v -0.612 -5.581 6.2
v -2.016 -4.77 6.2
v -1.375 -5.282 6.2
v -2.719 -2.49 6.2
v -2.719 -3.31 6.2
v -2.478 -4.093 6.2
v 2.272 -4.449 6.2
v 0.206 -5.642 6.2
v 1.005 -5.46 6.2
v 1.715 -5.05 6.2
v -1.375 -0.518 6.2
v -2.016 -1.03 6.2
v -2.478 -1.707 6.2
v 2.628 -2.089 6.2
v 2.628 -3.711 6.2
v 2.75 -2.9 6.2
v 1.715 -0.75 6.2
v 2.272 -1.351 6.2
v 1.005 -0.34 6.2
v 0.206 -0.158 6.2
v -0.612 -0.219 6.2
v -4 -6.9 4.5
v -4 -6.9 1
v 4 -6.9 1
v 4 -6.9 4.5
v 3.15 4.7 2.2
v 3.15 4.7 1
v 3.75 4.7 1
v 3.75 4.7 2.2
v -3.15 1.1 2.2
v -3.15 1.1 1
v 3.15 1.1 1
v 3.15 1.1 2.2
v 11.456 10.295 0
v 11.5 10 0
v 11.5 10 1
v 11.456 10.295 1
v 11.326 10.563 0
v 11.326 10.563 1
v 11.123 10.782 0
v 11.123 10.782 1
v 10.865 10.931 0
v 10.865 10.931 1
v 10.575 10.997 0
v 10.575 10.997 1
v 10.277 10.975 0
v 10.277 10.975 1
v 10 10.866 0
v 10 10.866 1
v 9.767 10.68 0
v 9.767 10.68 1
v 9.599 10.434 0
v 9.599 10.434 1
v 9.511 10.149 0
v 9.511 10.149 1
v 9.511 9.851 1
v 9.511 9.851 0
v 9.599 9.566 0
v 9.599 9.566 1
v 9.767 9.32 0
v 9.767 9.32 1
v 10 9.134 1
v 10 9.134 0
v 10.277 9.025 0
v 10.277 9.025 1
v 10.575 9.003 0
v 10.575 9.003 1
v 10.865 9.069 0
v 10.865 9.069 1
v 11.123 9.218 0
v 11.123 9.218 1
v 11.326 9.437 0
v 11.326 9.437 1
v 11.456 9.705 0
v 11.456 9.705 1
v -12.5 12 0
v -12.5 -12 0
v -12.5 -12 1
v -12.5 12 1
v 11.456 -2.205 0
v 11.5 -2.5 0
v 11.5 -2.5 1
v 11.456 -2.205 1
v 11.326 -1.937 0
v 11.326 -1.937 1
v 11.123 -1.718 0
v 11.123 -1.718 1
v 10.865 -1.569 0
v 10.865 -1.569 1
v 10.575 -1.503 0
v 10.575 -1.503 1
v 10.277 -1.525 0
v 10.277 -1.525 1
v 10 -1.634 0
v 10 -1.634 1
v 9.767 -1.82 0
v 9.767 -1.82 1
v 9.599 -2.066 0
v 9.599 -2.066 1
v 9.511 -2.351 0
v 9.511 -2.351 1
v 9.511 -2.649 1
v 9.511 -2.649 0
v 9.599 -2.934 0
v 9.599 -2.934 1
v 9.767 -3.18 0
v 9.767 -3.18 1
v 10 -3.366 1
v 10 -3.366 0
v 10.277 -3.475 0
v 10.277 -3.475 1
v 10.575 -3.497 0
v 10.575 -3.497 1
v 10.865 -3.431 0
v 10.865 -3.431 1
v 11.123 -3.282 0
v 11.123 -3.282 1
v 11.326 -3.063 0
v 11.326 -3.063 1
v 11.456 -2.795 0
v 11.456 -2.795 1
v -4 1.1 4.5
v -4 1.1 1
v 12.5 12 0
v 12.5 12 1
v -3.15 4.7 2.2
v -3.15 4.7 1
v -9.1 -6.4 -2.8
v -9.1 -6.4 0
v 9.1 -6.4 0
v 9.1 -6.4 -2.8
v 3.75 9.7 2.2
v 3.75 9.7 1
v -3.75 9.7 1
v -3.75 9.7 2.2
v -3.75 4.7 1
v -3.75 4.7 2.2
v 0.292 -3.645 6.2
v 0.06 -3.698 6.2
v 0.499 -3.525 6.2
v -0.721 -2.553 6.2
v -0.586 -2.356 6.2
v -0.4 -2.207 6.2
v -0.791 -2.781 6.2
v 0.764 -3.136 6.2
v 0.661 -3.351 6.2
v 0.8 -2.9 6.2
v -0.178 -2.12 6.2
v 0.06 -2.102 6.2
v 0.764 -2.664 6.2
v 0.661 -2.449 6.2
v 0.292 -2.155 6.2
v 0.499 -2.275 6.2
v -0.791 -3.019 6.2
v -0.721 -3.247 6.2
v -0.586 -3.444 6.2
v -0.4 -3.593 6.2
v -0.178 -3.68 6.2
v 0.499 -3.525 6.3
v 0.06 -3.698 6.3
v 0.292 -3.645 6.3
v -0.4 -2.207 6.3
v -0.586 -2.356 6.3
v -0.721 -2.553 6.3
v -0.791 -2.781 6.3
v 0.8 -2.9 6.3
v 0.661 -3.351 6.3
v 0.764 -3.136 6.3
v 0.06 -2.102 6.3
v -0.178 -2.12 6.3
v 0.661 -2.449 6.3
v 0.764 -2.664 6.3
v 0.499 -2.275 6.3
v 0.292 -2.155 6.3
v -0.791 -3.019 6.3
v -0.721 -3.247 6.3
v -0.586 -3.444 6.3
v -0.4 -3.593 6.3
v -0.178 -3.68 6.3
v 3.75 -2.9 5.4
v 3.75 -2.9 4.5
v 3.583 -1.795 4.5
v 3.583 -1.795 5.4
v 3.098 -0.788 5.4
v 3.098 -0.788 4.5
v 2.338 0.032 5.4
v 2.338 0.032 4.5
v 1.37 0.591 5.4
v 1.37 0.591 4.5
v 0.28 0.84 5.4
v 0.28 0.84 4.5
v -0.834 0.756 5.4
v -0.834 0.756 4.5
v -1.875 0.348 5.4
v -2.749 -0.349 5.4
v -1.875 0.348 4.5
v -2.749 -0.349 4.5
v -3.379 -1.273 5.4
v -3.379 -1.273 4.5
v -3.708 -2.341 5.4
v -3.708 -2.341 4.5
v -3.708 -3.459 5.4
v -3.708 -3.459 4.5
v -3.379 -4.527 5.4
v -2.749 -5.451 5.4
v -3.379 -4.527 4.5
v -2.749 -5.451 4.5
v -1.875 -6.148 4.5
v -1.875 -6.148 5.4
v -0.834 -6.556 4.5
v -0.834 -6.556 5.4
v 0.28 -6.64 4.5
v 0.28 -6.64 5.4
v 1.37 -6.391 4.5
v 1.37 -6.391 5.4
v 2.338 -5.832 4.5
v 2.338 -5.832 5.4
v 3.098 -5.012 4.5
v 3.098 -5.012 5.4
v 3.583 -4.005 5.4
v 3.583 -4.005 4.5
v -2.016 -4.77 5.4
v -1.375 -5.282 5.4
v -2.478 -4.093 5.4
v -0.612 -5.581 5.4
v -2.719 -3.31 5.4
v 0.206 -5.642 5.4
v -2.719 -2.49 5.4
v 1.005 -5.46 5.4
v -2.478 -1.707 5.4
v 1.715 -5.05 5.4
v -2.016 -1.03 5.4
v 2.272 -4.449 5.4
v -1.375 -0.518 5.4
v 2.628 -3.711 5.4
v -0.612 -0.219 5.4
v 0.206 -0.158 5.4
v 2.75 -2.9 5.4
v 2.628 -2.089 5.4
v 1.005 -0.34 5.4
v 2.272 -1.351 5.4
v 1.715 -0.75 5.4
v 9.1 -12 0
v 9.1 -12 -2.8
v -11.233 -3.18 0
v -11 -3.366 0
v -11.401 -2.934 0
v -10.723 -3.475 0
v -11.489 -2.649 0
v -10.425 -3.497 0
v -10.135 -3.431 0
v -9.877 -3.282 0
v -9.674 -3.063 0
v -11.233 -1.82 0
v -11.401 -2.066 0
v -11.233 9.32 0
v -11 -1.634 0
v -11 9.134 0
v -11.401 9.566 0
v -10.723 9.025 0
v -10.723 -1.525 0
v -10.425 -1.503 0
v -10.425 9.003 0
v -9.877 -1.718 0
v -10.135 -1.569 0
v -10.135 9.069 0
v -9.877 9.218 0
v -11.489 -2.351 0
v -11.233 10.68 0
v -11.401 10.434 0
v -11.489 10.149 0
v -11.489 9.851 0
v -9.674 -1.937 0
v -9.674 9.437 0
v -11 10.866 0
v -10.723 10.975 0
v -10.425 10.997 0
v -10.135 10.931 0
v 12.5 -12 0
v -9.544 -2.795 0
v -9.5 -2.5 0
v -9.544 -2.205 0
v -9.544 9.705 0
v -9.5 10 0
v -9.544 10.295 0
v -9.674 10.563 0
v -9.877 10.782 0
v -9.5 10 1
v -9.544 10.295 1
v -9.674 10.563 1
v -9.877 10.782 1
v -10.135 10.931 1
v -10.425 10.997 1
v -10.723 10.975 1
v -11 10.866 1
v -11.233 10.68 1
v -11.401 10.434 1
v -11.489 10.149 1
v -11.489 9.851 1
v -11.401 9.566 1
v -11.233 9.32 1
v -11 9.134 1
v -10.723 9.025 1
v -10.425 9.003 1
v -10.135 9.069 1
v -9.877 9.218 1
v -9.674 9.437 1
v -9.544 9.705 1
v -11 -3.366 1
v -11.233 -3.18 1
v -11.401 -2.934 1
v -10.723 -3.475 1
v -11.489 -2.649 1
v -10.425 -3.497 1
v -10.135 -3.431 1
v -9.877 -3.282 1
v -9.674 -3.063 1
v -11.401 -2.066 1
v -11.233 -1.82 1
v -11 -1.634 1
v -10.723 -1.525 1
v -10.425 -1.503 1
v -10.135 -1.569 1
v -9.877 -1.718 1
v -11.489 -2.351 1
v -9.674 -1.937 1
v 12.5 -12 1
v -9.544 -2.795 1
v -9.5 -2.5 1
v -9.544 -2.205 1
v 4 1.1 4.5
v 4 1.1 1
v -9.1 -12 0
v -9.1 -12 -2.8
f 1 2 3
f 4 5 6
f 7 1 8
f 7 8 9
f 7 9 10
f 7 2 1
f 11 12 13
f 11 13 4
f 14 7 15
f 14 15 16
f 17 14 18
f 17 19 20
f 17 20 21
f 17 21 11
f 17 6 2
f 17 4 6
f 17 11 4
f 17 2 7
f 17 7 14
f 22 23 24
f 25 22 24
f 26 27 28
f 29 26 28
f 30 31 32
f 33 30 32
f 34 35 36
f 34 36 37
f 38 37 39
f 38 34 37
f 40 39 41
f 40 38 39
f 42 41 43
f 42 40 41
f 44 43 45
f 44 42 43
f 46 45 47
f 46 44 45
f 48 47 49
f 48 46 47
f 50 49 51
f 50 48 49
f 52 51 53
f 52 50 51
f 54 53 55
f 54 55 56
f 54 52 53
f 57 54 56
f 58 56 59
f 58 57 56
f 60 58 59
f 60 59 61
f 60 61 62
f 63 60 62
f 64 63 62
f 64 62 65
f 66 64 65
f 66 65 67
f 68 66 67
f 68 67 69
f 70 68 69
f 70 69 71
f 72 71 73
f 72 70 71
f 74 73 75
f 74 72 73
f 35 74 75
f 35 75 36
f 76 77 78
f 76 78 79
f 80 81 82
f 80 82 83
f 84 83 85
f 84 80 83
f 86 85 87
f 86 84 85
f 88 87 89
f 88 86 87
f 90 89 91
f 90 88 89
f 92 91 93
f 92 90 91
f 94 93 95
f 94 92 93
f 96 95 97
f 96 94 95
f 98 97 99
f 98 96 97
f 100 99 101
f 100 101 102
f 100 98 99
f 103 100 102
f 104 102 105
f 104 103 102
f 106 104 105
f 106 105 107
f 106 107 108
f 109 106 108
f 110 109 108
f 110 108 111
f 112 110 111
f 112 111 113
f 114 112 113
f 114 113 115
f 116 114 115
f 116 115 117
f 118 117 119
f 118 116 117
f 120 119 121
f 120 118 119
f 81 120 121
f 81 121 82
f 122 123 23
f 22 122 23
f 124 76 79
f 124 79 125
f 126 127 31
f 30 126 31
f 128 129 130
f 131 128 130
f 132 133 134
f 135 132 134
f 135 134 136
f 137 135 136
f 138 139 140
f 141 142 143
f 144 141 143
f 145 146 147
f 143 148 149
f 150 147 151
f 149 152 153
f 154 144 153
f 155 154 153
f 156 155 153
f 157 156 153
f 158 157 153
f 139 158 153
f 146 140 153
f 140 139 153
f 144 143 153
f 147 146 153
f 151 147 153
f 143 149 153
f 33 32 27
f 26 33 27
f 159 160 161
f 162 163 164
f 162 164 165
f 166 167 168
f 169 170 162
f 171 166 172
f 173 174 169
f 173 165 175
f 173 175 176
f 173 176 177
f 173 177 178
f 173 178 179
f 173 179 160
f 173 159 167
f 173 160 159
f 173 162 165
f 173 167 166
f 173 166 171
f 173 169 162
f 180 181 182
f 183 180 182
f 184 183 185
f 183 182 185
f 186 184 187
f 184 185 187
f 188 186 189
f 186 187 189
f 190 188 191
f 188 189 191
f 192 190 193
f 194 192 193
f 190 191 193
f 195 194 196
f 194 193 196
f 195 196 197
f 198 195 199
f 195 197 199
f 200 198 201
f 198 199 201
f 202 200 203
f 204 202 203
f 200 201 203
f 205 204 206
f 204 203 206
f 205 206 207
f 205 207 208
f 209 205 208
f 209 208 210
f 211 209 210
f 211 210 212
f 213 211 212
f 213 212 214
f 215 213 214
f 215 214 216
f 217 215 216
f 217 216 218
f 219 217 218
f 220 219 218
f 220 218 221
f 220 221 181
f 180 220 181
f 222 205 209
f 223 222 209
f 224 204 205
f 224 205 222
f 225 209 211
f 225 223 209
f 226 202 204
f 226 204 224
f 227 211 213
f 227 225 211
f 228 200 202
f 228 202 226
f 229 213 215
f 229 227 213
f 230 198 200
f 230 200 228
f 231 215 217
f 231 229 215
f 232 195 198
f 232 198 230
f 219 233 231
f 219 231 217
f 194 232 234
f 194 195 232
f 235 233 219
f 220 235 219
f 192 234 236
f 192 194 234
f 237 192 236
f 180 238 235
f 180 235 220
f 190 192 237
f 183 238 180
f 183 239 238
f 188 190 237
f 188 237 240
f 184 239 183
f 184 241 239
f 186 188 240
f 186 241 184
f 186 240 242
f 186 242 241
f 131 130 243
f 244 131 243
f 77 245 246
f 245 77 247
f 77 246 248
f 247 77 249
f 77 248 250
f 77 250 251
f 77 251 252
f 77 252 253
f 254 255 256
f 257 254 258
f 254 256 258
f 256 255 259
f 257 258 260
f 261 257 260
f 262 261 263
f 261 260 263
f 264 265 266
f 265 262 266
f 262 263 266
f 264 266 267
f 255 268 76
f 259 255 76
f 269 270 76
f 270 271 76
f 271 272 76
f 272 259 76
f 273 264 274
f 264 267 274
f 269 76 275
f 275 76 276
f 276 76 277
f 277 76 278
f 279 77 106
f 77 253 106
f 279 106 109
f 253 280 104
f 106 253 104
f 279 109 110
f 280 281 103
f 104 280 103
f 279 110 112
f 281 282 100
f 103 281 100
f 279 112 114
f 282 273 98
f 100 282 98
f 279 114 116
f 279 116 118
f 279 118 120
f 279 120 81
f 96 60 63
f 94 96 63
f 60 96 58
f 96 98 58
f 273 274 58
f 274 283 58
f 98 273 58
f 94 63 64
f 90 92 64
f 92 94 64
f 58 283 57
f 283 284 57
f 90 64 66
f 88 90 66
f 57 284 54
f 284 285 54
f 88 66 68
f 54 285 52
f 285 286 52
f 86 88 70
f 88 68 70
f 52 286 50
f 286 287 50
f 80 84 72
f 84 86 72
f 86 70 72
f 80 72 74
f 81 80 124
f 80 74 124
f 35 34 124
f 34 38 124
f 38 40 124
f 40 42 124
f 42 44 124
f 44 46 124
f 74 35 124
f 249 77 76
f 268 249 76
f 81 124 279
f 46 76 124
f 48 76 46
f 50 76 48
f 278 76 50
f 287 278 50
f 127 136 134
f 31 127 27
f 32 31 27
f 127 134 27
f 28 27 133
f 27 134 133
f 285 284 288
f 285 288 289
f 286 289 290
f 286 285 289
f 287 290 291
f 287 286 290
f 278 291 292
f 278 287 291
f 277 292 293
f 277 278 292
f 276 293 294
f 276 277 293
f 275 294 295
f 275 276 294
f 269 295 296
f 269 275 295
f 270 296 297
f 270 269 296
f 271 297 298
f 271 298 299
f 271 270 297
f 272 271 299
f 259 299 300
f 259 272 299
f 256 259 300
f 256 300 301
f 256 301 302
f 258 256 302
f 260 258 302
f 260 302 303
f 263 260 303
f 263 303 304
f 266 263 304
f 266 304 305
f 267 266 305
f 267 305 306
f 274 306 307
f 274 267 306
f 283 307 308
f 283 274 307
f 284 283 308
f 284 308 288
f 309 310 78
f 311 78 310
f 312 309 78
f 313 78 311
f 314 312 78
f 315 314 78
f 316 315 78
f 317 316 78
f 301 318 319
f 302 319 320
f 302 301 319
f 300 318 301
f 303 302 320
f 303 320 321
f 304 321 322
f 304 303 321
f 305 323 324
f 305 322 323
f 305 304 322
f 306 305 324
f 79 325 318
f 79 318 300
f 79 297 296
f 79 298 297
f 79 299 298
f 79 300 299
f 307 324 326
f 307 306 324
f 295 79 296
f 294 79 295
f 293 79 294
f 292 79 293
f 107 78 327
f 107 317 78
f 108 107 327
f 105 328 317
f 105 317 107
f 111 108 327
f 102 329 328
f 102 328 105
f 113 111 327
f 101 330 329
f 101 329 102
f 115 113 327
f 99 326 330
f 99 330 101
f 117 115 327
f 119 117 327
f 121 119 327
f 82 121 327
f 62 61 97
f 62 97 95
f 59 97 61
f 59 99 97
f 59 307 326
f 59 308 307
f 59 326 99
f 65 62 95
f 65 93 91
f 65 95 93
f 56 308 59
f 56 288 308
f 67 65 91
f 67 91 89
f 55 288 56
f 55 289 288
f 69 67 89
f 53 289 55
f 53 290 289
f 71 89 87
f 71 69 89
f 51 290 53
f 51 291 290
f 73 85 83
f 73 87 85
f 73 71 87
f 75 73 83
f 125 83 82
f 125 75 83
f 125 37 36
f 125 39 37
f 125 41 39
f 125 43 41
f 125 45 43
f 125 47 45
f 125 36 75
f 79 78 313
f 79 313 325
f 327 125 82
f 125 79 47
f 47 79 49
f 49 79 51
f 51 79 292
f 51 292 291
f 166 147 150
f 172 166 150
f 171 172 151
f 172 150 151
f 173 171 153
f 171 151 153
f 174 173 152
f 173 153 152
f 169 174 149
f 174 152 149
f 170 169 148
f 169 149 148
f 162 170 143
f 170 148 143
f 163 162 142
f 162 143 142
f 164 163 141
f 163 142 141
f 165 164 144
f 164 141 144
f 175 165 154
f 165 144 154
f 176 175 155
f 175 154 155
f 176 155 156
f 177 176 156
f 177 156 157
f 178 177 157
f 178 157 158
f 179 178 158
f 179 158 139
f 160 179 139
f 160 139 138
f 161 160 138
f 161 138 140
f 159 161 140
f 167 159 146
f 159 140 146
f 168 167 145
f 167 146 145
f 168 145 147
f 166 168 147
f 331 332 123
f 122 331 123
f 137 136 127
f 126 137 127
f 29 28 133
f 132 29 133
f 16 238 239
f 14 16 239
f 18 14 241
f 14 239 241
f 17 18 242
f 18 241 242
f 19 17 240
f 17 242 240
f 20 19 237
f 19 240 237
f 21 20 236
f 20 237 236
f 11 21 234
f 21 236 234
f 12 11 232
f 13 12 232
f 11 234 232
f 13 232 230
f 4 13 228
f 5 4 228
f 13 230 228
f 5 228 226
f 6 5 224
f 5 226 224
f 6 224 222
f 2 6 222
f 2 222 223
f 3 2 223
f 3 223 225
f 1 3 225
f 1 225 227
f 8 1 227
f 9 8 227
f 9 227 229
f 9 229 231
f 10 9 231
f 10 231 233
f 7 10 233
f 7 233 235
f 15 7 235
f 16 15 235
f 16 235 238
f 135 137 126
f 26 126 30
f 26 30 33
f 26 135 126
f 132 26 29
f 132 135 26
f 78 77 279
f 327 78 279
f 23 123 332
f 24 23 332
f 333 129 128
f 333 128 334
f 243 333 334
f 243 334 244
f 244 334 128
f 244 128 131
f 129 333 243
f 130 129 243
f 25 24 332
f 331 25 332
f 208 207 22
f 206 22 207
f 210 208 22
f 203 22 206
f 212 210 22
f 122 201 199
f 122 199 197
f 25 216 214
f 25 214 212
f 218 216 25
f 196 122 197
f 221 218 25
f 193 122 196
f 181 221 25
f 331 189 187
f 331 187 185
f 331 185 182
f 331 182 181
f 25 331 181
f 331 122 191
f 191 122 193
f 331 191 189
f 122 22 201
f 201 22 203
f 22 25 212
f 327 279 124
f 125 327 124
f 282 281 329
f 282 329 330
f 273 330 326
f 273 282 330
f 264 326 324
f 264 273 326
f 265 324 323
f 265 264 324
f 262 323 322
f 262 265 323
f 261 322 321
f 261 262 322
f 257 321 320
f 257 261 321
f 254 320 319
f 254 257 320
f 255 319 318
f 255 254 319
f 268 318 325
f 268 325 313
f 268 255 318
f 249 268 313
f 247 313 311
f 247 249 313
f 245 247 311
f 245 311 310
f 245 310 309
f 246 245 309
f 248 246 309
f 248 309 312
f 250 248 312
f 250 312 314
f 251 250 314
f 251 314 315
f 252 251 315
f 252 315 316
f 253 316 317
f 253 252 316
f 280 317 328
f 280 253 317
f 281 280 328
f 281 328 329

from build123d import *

# Parameters (mm, degrees)
F0_W      = 25
F0_H      = 24
F0_R      = 1
F1_DEPTH  = 1
F2_R      = 3.75
F2_R_2    = 2.75
F3_DEPTH  = 3.5
F4_DEPTH  = 4.4
F5_DEPTH  = 5.2
F6_R      = 0.8
F7_DEPTH  = 0.1
F8_W      = 18.2
F8_H      = 5.6
F9_DEPTH  = 2.8
F11_DEPTH = 1.2


with BuildPart() as f1:
    # F0 (on Top) → F1 (new body)
    with BuildSketch(Plane.XY):
        Rectangle(F0_W, F0_H)
        with Locations((-10.5, -2.5)):
            Circle(F0_R, mode=Mode.SUBTRACT)
        with Locations((10.5, -2.5)):
            Circle(F0_R, mode=Mode.SUBTRACT)
        with Locations((-10.5, 10)):
            Circle(F0_R, mode=Mode.SUBTRACT)
        with Locations((10.5, 10)):
            Circle(F0_R, mode=Mode.SUBTRACT)
    extrude(amount=F1_DEPTH)


with BuildPart() as f3:
    # F2 (on face) → F3 (new body)
    with BuildSketch(Plane.XY.offset(1)):
        Polygon((4, -6.9), (4, 1.1), (3.4, 1.1), (-3.4, 1.1), (-4, 1.1), (-4, -6.9), align=None)
        with Locations((0, -2.9)):
            Circle(F2_R, mode=Mode.SUBTRACT)
        with Locations((0, -2.9)):
            Circle(F2_R)
        with Locations((0, -2.9)):
            Circle(F2_R_2, mode=Mode.SUBTRACT)
        with Locations((0, -2.9)):
            Circle(F2_R_2)
    extrude(amount=F3_DEPTH)

    # F2 (on face) → F4 (join)
    with BuildSketch(Plane.XY.offset(1)):
        with Locations((0, -2.9)):
            Circle(F2_R)
        with Locations((0, -2.9)):
            Circle(F2_R_2, mode=Mode.SUBTRACT)
        with Locations((0, -2.9)):
            Circle(F2_R_2)
    extrude(amount=F4_DEPTH)

    # F2 (on face) → F5 (join)
    with BuildSketch(Plane.XY.offset(1)):
        with Locations((0, -2.9)):
            Circle(F2_R_2)
    extrude(amount=F5_DEPTH)


with BuildPart() as f7:
    # F6 (on face) → F7 (new body)
    with BuildSketch(Plane.XY.offset(6.2)):
        with Locations((0, -2.9)):
            Circle(F6_R)
    extrude(amount=F7_DEPTH)


with BuildPart() as f9:
    # F8 (on face) → F9 (new body)
    with BuildSketch(Plane(origin=(0, 0, 0), x_dir=(1, 0, 0), z_dir=(0, 0, -1))):
        with Locations((0, 9.2)):
            Rectangle(F8_W, F8_H)
    extrude(amount=F9_DEPTH)


with BuildPart() as f11:
    # F10 (on face) → F11 (new body)
    with BuildSketch(Plane.XY.offset(1)):
        Polygon((-3.15, 4.7), (-3.15, 1.1), (3.15, 1.1), (3.15, 4.7), (3.75, 4.7), (3.75, 9.7), (-3.75, 9.7), (-3.75, 4.7), align=None)
    extrude(amount=F11_DEPTH)


solid = Compound([f1.part, f3.part, f7.part, f9.part, f11.part])
